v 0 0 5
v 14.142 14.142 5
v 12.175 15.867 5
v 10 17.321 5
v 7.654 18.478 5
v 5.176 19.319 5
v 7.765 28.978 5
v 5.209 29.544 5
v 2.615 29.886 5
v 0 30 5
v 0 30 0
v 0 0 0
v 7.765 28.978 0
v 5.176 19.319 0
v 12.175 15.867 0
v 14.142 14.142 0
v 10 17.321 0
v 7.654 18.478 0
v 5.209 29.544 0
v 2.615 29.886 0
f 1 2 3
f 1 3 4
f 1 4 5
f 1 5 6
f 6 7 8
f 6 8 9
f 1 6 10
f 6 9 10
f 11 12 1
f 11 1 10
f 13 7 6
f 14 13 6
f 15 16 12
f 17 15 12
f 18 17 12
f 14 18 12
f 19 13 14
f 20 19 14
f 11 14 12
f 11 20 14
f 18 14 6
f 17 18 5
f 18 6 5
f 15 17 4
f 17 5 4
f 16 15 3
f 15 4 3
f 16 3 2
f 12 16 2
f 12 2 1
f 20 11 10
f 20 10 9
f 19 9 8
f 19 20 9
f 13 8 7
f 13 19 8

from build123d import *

# Parameters (mm, degrees)
AUFSATZ_LINEAR_AUSTRAGEN2_DEPTH = 5
SCHNITT_LINEAR_AUSTRAGEN2_DEPTH = 38.080992435


with BuildPart() as part:
    # Skizze1 → Aufsatz-Linear austragen2 (new body)
    with BuildSketch(Plane.XY):
        with BuildLine():
            Line((0, 0), (0, 30))
            ThreePointArc((0, 30), (11.480502971, 27.716385975), (21.213203436, 21.213203436))
            Line((21.213203436, 21.213203436), (0, 0))
        make_face()
    extrude(amount=AUFSATZ_LINEAR_AUSTRAGEN2_DEPTH)

    # Skizze2 → Schnitt-Linear austragen2 (cut, through all)
    with BuildSketch(Plane.XY.offset(5)):
        with BuildLine():
            Line((14.142135624, 14.142135624), (21.213203436, 21.213203436))
            ThreePointArc((21.213203436, 21.213203436), (15, 25.980762114), (7.764571353, 28.977774789))
            Line((7.764571353, 28.977774789), (5.176380902, 19.318516526))
            ThreePointArc((5.176380902, 19.318516526), (10, 17.320508076), (14.142135624, 14.142135624))
        make_face()
    extrude(amount=-SCHNITT_LINEAR_AUSTRAGEN2_DEPTH, mode=Mode.SUBTRACT)


solid = part.part
